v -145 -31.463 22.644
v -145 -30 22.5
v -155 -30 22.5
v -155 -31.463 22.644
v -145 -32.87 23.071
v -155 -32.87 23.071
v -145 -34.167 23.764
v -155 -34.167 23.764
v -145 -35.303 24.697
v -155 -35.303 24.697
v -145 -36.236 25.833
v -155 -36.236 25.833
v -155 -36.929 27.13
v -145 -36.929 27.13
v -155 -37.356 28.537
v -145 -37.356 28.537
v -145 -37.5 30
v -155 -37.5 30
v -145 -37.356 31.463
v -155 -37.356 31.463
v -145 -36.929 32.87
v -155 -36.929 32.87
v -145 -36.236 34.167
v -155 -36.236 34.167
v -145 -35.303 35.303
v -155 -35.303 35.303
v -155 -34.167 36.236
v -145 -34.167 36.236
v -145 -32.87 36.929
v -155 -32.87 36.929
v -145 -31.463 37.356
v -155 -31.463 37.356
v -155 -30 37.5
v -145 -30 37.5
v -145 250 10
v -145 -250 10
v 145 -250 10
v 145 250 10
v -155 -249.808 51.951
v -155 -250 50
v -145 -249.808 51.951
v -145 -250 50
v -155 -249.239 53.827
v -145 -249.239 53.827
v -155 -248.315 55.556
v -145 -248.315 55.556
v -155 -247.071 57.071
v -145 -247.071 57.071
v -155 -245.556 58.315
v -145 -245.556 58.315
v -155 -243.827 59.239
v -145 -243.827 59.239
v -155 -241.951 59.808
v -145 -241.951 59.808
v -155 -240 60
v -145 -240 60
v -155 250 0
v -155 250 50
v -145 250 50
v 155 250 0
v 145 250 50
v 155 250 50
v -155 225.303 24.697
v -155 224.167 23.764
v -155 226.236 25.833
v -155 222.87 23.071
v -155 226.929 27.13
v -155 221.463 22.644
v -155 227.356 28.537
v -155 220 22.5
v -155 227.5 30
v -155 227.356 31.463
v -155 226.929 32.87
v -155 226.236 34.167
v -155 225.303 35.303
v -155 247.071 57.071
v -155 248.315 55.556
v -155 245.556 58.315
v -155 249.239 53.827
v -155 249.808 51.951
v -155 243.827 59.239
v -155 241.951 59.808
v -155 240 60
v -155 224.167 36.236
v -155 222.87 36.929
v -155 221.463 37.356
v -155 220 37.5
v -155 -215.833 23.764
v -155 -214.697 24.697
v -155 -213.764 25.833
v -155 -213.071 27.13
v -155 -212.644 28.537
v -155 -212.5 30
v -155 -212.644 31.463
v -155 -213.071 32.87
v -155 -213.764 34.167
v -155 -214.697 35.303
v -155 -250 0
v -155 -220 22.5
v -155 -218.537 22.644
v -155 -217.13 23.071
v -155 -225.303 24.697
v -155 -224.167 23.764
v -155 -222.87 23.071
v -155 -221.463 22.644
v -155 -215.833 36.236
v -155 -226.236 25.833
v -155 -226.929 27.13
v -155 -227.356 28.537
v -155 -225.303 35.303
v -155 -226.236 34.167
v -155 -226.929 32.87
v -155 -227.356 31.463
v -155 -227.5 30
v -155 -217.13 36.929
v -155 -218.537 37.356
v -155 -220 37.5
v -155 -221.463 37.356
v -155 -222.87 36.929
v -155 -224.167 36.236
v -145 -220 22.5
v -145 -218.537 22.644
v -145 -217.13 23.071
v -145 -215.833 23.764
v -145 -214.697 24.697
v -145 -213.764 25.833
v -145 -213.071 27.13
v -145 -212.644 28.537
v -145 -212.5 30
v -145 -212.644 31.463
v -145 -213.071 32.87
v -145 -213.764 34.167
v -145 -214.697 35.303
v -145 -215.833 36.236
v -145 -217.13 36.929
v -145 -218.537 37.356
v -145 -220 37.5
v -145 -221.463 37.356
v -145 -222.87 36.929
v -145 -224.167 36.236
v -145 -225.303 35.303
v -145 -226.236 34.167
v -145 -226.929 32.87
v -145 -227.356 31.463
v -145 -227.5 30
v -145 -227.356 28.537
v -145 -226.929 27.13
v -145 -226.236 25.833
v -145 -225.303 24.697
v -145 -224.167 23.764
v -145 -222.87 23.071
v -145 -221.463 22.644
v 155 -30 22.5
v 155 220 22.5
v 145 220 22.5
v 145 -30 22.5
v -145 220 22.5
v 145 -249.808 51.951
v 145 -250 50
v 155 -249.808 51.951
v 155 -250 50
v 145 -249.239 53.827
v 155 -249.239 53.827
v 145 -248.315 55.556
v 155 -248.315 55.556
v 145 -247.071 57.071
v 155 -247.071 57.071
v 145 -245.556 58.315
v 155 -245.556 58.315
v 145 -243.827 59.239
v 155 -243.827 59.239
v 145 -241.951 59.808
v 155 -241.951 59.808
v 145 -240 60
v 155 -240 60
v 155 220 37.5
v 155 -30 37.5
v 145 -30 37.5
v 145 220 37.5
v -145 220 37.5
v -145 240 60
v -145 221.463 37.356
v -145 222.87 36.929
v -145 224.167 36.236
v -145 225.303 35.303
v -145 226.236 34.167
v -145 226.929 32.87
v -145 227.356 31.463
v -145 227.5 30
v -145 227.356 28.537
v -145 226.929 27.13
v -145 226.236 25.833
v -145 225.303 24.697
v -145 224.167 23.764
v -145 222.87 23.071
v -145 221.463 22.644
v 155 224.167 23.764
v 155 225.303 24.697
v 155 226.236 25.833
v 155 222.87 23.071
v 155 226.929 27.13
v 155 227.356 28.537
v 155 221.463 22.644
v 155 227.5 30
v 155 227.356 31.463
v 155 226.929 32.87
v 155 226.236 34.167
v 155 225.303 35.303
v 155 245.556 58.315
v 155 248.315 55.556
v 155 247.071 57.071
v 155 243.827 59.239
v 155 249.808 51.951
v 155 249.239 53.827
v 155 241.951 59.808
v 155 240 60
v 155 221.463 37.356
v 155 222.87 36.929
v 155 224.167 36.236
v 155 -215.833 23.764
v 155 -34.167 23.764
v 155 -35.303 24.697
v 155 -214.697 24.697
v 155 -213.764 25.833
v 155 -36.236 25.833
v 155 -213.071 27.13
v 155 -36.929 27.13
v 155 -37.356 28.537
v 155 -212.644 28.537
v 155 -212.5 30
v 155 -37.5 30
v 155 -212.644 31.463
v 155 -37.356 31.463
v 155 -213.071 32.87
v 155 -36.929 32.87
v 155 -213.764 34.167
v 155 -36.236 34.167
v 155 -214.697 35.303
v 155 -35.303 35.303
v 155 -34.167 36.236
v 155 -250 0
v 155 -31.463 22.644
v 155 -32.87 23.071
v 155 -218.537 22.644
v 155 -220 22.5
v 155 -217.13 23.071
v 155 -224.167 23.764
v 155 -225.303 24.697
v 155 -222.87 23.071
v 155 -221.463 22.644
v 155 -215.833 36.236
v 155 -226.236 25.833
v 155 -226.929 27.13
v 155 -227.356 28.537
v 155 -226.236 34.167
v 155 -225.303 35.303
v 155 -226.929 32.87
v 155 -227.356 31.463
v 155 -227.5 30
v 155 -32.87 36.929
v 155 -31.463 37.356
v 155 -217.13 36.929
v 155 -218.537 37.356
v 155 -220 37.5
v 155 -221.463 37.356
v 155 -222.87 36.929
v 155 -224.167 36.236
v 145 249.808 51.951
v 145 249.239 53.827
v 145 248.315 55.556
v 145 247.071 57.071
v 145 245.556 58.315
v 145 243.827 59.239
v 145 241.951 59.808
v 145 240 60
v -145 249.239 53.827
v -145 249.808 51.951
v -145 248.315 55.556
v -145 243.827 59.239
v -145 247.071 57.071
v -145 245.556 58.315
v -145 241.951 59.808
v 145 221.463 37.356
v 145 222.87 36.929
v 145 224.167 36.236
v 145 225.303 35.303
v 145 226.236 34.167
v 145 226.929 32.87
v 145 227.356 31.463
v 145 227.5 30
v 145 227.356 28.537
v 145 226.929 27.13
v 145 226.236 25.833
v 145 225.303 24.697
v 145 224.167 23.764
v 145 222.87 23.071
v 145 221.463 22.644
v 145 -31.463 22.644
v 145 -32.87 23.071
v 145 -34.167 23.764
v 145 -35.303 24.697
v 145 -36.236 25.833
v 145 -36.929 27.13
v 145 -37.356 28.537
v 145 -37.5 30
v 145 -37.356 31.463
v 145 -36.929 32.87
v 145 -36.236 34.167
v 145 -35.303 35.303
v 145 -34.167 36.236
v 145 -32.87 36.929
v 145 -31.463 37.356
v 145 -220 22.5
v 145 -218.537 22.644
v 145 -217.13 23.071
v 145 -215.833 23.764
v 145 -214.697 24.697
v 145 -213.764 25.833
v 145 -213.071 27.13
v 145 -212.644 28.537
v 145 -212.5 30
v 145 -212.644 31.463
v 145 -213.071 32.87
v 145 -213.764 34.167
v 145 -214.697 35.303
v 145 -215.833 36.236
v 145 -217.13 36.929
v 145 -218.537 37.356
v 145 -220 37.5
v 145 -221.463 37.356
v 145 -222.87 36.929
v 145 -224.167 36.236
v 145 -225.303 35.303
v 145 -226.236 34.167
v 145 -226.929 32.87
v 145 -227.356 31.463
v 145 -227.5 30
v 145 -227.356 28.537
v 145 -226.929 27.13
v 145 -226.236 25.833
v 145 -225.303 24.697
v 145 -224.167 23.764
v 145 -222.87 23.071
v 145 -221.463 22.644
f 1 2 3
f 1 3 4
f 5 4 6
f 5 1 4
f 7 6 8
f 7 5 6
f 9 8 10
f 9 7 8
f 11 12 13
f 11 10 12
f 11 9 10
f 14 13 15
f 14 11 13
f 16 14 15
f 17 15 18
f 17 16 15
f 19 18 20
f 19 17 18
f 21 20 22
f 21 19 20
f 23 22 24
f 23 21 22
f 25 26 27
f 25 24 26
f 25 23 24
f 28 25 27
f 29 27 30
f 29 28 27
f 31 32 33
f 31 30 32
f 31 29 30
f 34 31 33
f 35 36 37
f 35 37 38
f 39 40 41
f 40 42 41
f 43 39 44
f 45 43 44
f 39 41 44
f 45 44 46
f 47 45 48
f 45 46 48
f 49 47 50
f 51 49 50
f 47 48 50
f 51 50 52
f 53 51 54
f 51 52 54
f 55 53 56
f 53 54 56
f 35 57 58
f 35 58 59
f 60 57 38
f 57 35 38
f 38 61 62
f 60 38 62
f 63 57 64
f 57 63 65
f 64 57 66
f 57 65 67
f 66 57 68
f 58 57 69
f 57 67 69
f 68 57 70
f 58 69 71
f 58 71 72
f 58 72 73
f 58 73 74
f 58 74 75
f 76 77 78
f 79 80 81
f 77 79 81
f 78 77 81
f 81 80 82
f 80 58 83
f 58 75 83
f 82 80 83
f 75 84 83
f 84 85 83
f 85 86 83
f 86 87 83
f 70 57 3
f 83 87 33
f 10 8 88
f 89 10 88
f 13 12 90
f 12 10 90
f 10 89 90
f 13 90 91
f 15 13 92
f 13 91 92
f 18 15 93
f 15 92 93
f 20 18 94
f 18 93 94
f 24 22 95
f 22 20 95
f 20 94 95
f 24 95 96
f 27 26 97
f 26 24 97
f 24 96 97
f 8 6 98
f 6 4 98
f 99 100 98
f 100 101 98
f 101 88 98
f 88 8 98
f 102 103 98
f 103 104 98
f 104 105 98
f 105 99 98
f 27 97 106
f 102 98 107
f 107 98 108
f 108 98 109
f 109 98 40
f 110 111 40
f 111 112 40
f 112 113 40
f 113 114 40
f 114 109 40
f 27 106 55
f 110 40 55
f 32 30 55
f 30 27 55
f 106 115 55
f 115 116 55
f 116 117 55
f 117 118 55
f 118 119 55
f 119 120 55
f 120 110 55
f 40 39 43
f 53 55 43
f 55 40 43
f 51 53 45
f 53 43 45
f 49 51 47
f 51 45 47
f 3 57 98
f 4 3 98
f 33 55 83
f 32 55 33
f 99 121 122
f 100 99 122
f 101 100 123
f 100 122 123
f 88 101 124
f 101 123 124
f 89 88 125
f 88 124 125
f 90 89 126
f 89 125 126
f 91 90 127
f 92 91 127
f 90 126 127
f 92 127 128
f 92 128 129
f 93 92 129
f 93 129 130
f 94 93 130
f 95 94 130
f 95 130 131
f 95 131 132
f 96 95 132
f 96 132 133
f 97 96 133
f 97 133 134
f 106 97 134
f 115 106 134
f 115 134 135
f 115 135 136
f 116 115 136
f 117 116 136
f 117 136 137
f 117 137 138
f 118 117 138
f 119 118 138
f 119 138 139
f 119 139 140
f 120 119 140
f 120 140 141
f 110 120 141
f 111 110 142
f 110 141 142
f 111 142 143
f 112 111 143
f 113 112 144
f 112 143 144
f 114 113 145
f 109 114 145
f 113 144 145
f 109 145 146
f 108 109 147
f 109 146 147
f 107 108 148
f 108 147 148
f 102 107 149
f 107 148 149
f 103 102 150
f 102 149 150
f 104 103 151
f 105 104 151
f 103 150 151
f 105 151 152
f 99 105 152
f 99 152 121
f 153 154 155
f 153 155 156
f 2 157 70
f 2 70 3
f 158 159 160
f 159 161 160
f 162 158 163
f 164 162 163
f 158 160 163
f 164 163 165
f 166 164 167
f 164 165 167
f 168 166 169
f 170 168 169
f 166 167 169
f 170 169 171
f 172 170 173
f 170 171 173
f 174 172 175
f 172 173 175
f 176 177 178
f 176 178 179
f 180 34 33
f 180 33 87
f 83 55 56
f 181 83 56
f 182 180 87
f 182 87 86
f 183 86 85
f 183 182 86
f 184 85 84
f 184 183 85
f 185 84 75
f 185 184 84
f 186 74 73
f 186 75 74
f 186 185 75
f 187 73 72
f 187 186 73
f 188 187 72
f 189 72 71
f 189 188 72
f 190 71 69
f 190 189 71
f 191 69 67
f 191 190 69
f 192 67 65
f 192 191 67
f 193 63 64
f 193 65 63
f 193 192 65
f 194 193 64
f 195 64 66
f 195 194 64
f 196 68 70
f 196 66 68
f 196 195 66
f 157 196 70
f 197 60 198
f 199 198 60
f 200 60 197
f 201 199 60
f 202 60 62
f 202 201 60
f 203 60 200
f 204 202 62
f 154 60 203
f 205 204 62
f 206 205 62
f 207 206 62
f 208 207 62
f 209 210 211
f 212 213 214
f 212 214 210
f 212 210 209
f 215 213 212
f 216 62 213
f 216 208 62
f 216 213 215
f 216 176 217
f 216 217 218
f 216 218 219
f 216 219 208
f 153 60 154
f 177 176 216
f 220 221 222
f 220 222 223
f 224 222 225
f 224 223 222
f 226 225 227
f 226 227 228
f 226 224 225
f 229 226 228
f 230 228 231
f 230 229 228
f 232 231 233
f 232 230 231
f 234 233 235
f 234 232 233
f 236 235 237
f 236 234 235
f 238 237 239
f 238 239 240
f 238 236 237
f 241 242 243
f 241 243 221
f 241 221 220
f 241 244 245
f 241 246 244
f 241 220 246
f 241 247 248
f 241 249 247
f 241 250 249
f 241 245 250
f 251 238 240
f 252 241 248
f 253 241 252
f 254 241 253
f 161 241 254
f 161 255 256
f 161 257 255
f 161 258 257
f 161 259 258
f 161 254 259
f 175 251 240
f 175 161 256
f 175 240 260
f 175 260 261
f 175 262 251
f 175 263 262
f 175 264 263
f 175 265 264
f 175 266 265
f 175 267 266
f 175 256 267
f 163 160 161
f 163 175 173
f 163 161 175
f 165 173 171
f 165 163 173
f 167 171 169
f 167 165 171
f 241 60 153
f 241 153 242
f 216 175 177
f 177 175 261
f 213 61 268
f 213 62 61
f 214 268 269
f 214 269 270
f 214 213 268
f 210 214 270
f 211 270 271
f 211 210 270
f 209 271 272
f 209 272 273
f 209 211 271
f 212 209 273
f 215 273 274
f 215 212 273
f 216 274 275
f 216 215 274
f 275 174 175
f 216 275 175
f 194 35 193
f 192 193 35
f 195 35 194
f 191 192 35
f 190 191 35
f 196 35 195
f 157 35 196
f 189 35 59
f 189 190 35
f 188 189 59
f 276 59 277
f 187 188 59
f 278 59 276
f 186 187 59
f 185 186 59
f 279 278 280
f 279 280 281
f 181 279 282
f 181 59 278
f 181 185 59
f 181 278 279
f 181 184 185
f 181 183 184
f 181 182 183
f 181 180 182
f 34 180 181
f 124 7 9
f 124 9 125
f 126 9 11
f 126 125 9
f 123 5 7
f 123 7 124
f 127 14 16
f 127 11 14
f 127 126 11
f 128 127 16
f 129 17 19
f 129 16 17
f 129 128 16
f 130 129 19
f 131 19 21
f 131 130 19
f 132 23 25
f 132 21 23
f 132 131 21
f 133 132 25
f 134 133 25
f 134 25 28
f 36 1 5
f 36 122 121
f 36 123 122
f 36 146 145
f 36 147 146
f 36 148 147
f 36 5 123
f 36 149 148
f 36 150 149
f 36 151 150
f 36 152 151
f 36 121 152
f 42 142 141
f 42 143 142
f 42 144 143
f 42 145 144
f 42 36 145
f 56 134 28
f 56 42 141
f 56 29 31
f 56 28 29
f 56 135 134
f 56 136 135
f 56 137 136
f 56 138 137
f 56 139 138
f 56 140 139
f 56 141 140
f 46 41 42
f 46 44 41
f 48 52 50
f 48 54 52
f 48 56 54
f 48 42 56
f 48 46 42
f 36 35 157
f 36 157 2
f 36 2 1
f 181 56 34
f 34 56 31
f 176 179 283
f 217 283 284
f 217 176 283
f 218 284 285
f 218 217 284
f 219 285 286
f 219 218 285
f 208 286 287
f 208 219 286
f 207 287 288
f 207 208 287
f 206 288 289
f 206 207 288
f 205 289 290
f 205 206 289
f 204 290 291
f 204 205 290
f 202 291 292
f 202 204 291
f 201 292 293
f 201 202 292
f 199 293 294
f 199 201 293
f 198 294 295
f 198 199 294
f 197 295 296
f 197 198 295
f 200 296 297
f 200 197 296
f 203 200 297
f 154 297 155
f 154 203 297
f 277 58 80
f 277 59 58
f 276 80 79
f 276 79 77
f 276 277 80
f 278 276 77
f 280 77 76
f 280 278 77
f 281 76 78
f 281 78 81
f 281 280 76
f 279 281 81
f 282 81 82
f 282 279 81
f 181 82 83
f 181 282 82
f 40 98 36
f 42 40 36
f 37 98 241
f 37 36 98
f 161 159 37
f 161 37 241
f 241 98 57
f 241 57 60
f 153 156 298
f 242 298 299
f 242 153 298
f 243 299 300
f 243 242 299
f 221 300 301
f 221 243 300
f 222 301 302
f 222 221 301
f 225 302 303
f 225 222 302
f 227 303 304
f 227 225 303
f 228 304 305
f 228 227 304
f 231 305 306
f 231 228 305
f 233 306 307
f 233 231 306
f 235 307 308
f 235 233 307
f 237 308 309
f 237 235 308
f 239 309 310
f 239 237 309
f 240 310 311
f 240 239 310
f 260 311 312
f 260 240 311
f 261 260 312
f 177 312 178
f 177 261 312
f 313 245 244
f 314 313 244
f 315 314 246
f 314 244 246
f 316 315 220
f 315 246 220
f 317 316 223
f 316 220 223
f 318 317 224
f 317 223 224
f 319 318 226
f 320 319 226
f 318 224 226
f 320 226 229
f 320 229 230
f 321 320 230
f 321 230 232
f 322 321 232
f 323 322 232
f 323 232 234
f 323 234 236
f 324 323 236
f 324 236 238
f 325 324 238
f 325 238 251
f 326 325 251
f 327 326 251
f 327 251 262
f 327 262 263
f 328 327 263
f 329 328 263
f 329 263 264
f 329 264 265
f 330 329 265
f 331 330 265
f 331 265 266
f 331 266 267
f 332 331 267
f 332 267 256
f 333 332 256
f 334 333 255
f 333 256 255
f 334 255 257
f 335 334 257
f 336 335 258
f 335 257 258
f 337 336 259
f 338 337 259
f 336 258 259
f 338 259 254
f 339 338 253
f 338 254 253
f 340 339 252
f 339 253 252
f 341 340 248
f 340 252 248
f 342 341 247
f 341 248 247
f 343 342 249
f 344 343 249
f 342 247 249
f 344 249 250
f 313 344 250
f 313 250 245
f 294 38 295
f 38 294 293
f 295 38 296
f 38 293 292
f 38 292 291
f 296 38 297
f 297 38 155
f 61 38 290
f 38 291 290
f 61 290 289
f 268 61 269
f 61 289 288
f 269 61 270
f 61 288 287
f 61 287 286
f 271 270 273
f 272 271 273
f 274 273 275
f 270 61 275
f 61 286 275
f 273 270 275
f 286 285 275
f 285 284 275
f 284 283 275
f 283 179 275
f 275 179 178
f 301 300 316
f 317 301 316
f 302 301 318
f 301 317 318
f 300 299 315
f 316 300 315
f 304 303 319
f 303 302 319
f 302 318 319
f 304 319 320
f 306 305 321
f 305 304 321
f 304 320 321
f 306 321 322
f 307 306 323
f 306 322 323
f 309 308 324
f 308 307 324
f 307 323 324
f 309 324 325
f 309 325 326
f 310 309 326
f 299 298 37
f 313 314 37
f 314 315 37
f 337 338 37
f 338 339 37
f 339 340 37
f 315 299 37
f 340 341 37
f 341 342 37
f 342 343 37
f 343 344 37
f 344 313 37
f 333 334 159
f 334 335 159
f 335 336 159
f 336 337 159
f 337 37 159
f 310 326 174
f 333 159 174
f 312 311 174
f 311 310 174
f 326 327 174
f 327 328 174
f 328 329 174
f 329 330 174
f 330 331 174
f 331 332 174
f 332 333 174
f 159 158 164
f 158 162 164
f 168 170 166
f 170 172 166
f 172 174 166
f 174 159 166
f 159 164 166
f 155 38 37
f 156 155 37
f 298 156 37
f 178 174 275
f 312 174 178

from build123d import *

# Parameters (mm, degrees)
SKETCH1_W           = 500
SKETCH1_H           = 300
BOSS_EXTRUDE1_DEPTH = 10
SKETCH2_W           = 10
SKETCH2_H           = 60
EXTRUDE_THIN1_DEPTH = 500
SKETCH3_R           = 7.5
CUT_EXTRUDE1_DEPTH  = 403.740611312
FILLET1_R           = 10


with BuildPart() as part:
    # Sketch1 → Boss-Extrude1 (new body)
    with BuildSketch(Plane(origin=(0, 0, 0), x_dir=(0, 1, 0), z_dir=(0, 0, 1))):
        Rectangle(SKETCH1_W, SKETCH1_H)
    extrude(amount=BOSS_EXTRUDE1_DEPTH)

    # Sketch2 → Extrude-Thin1 (add)
    with BuildSketch(Plane.XZ.offset(250)):
        with Locations((-150, 30)):
            Rectangle(SKETCH2_W, SKETCH2_H)
        with Locations((150, 30)):
            Rectangle(SKETCH2_W, SKETCH2_H)
    extrude(amount=-EXTRUDE_THIN1_DEPTH)

    # Sketch3 → Cut-Extrude1 (cut, through all)
    with BuildSketch(Plane.YZ.offset(155)):
        with Locations(Location((-220, 30, 0), (0, 0, 270))):
            Circle(SKETCH3_R)
        with BuildLine():
            Line((-30, 37.5), (220, 37.5))
            ThreePointArc((220, 37.5), (227.5, 30), (220, 22.5))
            Line((220, 22.5), (-30, 22.5))
            ThreePointArc((-30, 22.5), (-37.5, 30), (-30, 37.5))
        make_face()
    extrude(amount=-CUT_EXTRUDE1_DEPTH, mode=Mode.SUBTRACT)

    # Fillet1
    fillet1_edges = [part.edges().sort_by_distance(p)[0] for p in [
        (-150, 250, 60),
        (-150, -250, 60),
        (150, 250, 60),
        (150, -250, 60),
    ]]
    fillet(fillet1_edges, radius=FILLET1_R)


solid = part.part
